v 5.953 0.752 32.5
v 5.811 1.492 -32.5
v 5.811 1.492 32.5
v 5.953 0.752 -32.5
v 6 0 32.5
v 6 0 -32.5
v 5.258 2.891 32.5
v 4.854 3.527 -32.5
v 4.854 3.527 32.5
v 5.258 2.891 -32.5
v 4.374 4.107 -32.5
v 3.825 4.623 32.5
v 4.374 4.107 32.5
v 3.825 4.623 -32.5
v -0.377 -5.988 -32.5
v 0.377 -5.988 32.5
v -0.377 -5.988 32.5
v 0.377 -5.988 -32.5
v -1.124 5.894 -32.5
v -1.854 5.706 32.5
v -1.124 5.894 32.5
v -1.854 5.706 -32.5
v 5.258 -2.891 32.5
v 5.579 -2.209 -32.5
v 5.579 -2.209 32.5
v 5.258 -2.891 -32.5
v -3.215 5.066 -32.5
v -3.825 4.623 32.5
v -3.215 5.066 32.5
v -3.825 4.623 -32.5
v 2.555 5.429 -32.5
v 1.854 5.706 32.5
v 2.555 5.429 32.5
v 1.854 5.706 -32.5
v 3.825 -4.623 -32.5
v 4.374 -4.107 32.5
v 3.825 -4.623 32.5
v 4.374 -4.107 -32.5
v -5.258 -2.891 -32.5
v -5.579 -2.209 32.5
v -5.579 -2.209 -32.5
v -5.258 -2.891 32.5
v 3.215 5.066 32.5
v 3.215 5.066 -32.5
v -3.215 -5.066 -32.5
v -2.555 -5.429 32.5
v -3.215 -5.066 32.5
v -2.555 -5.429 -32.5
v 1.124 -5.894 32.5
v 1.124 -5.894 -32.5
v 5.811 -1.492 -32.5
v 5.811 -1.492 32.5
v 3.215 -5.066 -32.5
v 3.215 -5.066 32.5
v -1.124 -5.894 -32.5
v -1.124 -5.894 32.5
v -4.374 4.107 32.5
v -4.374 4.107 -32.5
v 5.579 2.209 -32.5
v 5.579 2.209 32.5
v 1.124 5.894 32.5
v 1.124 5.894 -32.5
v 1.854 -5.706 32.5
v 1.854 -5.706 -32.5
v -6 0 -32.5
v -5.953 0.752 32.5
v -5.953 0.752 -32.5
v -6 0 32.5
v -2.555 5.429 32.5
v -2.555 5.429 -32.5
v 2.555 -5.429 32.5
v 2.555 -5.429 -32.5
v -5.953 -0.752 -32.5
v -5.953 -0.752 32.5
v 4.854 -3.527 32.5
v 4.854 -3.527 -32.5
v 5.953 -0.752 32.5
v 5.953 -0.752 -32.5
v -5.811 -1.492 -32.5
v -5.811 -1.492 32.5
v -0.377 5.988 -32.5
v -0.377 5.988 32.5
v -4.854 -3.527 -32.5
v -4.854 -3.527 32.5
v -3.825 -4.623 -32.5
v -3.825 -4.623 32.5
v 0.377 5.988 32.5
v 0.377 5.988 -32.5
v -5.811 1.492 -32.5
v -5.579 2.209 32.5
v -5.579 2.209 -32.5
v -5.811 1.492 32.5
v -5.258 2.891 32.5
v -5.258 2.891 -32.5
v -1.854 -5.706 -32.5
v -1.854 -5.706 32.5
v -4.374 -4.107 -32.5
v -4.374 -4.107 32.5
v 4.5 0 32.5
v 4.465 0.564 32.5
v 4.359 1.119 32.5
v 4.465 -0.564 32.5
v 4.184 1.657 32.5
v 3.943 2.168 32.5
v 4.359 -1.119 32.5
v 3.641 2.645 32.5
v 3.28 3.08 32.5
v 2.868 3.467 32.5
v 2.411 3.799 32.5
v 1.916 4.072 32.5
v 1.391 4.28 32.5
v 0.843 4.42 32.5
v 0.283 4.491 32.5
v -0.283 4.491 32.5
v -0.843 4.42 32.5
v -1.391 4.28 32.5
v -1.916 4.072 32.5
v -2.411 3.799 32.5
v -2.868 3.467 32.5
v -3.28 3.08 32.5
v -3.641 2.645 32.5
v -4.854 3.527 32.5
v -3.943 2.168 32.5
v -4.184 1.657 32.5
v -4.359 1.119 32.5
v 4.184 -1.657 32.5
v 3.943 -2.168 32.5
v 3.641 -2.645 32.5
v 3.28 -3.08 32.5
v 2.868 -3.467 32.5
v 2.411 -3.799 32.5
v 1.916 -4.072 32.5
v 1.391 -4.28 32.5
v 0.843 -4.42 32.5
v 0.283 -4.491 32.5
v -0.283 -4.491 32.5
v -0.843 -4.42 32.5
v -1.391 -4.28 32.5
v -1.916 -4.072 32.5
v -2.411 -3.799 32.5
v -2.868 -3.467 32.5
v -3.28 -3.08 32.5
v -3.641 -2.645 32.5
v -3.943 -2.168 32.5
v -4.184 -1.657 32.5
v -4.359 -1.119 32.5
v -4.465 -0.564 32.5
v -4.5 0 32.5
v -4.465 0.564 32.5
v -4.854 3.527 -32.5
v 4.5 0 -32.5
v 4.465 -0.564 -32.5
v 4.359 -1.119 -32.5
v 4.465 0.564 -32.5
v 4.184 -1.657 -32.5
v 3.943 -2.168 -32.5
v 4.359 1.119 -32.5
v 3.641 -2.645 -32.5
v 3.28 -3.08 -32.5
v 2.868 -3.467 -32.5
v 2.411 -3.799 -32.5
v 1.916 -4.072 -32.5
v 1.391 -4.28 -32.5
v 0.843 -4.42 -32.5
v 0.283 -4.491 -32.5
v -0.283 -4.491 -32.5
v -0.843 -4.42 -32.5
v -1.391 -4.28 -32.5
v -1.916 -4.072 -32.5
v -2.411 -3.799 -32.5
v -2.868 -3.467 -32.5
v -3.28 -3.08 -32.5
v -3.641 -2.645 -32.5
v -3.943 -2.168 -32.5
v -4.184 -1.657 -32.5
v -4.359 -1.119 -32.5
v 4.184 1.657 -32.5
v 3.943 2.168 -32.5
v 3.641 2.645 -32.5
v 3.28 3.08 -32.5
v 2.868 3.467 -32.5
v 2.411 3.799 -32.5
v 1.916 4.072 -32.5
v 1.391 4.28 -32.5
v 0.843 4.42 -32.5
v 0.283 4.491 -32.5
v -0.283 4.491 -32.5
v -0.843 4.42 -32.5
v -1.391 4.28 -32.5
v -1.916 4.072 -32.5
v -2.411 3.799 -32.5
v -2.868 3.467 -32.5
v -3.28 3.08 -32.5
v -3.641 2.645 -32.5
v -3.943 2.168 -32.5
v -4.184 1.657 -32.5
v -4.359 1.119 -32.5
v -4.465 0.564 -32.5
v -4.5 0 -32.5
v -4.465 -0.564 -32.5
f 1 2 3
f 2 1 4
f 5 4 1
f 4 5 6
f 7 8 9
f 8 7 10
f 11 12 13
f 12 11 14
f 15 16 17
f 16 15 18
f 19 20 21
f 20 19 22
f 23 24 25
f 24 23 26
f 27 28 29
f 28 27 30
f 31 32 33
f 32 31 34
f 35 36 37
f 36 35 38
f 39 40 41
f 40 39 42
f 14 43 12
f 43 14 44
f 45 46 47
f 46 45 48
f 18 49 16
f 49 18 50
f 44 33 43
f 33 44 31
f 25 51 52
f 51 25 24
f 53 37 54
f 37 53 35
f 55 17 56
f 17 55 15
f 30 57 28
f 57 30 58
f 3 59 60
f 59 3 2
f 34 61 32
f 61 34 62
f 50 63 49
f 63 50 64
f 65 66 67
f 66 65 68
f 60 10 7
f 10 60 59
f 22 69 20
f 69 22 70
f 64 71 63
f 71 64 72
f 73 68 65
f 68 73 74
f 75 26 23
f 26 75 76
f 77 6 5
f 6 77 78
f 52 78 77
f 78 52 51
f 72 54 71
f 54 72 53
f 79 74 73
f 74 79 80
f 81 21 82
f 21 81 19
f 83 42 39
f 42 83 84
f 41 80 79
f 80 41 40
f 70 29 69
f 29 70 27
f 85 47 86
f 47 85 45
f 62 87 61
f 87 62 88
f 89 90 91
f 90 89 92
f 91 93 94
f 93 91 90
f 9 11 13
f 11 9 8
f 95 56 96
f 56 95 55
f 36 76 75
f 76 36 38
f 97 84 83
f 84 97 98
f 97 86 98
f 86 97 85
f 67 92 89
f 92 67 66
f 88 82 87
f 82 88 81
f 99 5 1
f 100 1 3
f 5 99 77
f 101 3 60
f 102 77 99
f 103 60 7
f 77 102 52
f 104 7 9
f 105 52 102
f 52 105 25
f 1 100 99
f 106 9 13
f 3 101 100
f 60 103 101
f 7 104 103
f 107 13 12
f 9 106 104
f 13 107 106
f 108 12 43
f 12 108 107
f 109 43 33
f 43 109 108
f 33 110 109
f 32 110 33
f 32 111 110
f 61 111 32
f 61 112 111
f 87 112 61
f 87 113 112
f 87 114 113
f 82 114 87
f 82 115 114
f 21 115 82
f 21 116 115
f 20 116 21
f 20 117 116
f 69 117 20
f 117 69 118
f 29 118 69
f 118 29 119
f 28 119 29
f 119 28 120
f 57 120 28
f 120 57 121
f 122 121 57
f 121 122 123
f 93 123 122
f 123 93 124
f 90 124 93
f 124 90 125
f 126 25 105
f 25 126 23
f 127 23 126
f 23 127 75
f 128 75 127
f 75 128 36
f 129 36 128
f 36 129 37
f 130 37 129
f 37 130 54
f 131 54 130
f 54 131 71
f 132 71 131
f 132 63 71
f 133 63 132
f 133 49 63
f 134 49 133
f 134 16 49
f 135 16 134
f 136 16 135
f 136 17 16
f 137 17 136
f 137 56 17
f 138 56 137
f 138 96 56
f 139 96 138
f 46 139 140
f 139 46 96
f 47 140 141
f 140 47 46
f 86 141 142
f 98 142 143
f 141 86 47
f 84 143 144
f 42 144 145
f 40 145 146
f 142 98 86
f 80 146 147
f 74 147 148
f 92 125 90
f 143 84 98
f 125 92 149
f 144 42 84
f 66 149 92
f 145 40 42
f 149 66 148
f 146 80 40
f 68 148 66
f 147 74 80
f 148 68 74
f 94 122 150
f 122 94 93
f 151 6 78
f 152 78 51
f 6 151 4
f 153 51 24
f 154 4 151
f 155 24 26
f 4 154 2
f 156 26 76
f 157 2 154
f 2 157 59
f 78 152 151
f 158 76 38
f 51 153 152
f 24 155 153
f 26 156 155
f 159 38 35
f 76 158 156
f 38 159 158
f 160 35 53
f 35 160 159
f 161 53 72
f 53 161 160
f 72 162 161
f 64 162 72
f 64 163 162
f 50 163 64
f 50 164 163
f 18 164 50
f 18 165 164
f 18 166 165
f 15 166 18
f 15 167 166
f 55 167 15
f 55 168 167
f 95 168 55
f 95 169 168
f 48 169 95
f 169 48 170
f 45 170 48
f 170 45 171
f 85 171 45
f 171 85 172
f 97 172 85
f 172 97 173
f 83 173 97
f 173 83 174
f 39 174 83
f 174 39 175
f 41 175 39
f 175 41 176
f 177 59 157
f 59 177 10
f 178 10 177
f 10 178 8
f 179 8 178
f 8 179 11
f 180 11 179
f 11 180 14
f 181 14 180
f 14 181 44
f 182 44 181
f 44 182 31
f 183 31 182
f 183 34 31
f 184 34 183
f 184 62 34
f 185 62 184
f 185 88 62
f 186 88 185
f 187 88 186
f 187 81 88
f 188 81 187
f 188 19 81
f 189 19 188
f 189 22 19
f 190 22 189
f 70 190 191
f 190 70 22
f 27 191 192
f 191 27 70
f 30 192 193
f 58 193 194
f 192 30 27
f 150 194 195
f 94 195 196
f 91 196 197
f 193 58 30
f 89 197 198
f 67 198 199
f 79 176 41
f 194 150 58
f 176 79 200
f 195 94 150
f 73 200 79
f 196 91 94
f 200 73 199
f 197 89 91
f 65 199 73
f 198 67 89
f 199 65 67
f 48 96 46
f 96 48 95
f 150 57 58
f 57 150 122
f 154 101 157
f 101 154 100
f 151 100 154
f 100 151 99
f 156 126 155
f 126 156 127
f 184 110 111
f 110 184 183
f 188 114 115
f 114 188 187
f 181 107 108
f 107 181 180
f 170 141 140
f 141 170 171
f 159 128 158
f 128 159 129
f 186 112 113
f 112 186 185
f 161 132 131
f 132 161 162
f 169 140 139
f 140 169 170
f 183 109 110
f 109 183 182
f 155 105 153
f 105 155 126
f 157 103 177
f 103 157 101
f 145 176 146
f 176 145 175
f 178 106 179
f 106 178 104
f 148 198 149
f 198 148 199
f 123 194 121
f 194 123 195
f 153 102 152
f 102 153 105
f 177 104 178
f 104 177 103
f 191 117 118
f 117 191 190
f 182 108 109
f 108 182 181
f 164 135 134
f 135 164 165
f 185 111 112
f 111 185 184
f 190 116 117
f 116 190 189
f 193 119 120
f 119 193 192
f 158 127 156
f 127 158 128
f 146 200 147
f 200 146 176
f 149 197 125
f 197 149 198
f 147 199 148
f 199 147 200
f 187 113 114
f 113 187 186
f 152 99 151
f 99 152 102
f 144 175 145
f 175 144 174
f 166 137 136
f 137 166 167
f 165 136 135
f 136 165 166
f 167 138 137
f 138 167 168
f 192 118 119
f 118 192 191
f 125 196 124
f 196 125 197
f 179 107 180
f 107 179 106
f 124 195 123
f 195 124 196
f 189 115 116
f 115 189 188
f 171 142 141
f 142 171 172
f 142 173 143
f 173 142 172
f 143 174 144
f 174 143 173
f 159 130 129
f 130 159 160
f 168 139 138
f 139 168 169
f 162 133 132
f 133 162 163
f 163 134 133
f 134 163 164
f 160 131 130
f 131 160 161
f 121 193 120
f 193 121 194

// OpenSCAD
$fn = 50;


difference() {
	union() {
		translate(v = [0, 0, -32.5000000000]) {
			cylinder(h = 65, r = 6.0000000000);
		}
	}
	union() {
		translate(v = [0, 0, -100.0000000000]) {
			cylinder(h = 200, r = 4.5000000000);
		}
	}
}
